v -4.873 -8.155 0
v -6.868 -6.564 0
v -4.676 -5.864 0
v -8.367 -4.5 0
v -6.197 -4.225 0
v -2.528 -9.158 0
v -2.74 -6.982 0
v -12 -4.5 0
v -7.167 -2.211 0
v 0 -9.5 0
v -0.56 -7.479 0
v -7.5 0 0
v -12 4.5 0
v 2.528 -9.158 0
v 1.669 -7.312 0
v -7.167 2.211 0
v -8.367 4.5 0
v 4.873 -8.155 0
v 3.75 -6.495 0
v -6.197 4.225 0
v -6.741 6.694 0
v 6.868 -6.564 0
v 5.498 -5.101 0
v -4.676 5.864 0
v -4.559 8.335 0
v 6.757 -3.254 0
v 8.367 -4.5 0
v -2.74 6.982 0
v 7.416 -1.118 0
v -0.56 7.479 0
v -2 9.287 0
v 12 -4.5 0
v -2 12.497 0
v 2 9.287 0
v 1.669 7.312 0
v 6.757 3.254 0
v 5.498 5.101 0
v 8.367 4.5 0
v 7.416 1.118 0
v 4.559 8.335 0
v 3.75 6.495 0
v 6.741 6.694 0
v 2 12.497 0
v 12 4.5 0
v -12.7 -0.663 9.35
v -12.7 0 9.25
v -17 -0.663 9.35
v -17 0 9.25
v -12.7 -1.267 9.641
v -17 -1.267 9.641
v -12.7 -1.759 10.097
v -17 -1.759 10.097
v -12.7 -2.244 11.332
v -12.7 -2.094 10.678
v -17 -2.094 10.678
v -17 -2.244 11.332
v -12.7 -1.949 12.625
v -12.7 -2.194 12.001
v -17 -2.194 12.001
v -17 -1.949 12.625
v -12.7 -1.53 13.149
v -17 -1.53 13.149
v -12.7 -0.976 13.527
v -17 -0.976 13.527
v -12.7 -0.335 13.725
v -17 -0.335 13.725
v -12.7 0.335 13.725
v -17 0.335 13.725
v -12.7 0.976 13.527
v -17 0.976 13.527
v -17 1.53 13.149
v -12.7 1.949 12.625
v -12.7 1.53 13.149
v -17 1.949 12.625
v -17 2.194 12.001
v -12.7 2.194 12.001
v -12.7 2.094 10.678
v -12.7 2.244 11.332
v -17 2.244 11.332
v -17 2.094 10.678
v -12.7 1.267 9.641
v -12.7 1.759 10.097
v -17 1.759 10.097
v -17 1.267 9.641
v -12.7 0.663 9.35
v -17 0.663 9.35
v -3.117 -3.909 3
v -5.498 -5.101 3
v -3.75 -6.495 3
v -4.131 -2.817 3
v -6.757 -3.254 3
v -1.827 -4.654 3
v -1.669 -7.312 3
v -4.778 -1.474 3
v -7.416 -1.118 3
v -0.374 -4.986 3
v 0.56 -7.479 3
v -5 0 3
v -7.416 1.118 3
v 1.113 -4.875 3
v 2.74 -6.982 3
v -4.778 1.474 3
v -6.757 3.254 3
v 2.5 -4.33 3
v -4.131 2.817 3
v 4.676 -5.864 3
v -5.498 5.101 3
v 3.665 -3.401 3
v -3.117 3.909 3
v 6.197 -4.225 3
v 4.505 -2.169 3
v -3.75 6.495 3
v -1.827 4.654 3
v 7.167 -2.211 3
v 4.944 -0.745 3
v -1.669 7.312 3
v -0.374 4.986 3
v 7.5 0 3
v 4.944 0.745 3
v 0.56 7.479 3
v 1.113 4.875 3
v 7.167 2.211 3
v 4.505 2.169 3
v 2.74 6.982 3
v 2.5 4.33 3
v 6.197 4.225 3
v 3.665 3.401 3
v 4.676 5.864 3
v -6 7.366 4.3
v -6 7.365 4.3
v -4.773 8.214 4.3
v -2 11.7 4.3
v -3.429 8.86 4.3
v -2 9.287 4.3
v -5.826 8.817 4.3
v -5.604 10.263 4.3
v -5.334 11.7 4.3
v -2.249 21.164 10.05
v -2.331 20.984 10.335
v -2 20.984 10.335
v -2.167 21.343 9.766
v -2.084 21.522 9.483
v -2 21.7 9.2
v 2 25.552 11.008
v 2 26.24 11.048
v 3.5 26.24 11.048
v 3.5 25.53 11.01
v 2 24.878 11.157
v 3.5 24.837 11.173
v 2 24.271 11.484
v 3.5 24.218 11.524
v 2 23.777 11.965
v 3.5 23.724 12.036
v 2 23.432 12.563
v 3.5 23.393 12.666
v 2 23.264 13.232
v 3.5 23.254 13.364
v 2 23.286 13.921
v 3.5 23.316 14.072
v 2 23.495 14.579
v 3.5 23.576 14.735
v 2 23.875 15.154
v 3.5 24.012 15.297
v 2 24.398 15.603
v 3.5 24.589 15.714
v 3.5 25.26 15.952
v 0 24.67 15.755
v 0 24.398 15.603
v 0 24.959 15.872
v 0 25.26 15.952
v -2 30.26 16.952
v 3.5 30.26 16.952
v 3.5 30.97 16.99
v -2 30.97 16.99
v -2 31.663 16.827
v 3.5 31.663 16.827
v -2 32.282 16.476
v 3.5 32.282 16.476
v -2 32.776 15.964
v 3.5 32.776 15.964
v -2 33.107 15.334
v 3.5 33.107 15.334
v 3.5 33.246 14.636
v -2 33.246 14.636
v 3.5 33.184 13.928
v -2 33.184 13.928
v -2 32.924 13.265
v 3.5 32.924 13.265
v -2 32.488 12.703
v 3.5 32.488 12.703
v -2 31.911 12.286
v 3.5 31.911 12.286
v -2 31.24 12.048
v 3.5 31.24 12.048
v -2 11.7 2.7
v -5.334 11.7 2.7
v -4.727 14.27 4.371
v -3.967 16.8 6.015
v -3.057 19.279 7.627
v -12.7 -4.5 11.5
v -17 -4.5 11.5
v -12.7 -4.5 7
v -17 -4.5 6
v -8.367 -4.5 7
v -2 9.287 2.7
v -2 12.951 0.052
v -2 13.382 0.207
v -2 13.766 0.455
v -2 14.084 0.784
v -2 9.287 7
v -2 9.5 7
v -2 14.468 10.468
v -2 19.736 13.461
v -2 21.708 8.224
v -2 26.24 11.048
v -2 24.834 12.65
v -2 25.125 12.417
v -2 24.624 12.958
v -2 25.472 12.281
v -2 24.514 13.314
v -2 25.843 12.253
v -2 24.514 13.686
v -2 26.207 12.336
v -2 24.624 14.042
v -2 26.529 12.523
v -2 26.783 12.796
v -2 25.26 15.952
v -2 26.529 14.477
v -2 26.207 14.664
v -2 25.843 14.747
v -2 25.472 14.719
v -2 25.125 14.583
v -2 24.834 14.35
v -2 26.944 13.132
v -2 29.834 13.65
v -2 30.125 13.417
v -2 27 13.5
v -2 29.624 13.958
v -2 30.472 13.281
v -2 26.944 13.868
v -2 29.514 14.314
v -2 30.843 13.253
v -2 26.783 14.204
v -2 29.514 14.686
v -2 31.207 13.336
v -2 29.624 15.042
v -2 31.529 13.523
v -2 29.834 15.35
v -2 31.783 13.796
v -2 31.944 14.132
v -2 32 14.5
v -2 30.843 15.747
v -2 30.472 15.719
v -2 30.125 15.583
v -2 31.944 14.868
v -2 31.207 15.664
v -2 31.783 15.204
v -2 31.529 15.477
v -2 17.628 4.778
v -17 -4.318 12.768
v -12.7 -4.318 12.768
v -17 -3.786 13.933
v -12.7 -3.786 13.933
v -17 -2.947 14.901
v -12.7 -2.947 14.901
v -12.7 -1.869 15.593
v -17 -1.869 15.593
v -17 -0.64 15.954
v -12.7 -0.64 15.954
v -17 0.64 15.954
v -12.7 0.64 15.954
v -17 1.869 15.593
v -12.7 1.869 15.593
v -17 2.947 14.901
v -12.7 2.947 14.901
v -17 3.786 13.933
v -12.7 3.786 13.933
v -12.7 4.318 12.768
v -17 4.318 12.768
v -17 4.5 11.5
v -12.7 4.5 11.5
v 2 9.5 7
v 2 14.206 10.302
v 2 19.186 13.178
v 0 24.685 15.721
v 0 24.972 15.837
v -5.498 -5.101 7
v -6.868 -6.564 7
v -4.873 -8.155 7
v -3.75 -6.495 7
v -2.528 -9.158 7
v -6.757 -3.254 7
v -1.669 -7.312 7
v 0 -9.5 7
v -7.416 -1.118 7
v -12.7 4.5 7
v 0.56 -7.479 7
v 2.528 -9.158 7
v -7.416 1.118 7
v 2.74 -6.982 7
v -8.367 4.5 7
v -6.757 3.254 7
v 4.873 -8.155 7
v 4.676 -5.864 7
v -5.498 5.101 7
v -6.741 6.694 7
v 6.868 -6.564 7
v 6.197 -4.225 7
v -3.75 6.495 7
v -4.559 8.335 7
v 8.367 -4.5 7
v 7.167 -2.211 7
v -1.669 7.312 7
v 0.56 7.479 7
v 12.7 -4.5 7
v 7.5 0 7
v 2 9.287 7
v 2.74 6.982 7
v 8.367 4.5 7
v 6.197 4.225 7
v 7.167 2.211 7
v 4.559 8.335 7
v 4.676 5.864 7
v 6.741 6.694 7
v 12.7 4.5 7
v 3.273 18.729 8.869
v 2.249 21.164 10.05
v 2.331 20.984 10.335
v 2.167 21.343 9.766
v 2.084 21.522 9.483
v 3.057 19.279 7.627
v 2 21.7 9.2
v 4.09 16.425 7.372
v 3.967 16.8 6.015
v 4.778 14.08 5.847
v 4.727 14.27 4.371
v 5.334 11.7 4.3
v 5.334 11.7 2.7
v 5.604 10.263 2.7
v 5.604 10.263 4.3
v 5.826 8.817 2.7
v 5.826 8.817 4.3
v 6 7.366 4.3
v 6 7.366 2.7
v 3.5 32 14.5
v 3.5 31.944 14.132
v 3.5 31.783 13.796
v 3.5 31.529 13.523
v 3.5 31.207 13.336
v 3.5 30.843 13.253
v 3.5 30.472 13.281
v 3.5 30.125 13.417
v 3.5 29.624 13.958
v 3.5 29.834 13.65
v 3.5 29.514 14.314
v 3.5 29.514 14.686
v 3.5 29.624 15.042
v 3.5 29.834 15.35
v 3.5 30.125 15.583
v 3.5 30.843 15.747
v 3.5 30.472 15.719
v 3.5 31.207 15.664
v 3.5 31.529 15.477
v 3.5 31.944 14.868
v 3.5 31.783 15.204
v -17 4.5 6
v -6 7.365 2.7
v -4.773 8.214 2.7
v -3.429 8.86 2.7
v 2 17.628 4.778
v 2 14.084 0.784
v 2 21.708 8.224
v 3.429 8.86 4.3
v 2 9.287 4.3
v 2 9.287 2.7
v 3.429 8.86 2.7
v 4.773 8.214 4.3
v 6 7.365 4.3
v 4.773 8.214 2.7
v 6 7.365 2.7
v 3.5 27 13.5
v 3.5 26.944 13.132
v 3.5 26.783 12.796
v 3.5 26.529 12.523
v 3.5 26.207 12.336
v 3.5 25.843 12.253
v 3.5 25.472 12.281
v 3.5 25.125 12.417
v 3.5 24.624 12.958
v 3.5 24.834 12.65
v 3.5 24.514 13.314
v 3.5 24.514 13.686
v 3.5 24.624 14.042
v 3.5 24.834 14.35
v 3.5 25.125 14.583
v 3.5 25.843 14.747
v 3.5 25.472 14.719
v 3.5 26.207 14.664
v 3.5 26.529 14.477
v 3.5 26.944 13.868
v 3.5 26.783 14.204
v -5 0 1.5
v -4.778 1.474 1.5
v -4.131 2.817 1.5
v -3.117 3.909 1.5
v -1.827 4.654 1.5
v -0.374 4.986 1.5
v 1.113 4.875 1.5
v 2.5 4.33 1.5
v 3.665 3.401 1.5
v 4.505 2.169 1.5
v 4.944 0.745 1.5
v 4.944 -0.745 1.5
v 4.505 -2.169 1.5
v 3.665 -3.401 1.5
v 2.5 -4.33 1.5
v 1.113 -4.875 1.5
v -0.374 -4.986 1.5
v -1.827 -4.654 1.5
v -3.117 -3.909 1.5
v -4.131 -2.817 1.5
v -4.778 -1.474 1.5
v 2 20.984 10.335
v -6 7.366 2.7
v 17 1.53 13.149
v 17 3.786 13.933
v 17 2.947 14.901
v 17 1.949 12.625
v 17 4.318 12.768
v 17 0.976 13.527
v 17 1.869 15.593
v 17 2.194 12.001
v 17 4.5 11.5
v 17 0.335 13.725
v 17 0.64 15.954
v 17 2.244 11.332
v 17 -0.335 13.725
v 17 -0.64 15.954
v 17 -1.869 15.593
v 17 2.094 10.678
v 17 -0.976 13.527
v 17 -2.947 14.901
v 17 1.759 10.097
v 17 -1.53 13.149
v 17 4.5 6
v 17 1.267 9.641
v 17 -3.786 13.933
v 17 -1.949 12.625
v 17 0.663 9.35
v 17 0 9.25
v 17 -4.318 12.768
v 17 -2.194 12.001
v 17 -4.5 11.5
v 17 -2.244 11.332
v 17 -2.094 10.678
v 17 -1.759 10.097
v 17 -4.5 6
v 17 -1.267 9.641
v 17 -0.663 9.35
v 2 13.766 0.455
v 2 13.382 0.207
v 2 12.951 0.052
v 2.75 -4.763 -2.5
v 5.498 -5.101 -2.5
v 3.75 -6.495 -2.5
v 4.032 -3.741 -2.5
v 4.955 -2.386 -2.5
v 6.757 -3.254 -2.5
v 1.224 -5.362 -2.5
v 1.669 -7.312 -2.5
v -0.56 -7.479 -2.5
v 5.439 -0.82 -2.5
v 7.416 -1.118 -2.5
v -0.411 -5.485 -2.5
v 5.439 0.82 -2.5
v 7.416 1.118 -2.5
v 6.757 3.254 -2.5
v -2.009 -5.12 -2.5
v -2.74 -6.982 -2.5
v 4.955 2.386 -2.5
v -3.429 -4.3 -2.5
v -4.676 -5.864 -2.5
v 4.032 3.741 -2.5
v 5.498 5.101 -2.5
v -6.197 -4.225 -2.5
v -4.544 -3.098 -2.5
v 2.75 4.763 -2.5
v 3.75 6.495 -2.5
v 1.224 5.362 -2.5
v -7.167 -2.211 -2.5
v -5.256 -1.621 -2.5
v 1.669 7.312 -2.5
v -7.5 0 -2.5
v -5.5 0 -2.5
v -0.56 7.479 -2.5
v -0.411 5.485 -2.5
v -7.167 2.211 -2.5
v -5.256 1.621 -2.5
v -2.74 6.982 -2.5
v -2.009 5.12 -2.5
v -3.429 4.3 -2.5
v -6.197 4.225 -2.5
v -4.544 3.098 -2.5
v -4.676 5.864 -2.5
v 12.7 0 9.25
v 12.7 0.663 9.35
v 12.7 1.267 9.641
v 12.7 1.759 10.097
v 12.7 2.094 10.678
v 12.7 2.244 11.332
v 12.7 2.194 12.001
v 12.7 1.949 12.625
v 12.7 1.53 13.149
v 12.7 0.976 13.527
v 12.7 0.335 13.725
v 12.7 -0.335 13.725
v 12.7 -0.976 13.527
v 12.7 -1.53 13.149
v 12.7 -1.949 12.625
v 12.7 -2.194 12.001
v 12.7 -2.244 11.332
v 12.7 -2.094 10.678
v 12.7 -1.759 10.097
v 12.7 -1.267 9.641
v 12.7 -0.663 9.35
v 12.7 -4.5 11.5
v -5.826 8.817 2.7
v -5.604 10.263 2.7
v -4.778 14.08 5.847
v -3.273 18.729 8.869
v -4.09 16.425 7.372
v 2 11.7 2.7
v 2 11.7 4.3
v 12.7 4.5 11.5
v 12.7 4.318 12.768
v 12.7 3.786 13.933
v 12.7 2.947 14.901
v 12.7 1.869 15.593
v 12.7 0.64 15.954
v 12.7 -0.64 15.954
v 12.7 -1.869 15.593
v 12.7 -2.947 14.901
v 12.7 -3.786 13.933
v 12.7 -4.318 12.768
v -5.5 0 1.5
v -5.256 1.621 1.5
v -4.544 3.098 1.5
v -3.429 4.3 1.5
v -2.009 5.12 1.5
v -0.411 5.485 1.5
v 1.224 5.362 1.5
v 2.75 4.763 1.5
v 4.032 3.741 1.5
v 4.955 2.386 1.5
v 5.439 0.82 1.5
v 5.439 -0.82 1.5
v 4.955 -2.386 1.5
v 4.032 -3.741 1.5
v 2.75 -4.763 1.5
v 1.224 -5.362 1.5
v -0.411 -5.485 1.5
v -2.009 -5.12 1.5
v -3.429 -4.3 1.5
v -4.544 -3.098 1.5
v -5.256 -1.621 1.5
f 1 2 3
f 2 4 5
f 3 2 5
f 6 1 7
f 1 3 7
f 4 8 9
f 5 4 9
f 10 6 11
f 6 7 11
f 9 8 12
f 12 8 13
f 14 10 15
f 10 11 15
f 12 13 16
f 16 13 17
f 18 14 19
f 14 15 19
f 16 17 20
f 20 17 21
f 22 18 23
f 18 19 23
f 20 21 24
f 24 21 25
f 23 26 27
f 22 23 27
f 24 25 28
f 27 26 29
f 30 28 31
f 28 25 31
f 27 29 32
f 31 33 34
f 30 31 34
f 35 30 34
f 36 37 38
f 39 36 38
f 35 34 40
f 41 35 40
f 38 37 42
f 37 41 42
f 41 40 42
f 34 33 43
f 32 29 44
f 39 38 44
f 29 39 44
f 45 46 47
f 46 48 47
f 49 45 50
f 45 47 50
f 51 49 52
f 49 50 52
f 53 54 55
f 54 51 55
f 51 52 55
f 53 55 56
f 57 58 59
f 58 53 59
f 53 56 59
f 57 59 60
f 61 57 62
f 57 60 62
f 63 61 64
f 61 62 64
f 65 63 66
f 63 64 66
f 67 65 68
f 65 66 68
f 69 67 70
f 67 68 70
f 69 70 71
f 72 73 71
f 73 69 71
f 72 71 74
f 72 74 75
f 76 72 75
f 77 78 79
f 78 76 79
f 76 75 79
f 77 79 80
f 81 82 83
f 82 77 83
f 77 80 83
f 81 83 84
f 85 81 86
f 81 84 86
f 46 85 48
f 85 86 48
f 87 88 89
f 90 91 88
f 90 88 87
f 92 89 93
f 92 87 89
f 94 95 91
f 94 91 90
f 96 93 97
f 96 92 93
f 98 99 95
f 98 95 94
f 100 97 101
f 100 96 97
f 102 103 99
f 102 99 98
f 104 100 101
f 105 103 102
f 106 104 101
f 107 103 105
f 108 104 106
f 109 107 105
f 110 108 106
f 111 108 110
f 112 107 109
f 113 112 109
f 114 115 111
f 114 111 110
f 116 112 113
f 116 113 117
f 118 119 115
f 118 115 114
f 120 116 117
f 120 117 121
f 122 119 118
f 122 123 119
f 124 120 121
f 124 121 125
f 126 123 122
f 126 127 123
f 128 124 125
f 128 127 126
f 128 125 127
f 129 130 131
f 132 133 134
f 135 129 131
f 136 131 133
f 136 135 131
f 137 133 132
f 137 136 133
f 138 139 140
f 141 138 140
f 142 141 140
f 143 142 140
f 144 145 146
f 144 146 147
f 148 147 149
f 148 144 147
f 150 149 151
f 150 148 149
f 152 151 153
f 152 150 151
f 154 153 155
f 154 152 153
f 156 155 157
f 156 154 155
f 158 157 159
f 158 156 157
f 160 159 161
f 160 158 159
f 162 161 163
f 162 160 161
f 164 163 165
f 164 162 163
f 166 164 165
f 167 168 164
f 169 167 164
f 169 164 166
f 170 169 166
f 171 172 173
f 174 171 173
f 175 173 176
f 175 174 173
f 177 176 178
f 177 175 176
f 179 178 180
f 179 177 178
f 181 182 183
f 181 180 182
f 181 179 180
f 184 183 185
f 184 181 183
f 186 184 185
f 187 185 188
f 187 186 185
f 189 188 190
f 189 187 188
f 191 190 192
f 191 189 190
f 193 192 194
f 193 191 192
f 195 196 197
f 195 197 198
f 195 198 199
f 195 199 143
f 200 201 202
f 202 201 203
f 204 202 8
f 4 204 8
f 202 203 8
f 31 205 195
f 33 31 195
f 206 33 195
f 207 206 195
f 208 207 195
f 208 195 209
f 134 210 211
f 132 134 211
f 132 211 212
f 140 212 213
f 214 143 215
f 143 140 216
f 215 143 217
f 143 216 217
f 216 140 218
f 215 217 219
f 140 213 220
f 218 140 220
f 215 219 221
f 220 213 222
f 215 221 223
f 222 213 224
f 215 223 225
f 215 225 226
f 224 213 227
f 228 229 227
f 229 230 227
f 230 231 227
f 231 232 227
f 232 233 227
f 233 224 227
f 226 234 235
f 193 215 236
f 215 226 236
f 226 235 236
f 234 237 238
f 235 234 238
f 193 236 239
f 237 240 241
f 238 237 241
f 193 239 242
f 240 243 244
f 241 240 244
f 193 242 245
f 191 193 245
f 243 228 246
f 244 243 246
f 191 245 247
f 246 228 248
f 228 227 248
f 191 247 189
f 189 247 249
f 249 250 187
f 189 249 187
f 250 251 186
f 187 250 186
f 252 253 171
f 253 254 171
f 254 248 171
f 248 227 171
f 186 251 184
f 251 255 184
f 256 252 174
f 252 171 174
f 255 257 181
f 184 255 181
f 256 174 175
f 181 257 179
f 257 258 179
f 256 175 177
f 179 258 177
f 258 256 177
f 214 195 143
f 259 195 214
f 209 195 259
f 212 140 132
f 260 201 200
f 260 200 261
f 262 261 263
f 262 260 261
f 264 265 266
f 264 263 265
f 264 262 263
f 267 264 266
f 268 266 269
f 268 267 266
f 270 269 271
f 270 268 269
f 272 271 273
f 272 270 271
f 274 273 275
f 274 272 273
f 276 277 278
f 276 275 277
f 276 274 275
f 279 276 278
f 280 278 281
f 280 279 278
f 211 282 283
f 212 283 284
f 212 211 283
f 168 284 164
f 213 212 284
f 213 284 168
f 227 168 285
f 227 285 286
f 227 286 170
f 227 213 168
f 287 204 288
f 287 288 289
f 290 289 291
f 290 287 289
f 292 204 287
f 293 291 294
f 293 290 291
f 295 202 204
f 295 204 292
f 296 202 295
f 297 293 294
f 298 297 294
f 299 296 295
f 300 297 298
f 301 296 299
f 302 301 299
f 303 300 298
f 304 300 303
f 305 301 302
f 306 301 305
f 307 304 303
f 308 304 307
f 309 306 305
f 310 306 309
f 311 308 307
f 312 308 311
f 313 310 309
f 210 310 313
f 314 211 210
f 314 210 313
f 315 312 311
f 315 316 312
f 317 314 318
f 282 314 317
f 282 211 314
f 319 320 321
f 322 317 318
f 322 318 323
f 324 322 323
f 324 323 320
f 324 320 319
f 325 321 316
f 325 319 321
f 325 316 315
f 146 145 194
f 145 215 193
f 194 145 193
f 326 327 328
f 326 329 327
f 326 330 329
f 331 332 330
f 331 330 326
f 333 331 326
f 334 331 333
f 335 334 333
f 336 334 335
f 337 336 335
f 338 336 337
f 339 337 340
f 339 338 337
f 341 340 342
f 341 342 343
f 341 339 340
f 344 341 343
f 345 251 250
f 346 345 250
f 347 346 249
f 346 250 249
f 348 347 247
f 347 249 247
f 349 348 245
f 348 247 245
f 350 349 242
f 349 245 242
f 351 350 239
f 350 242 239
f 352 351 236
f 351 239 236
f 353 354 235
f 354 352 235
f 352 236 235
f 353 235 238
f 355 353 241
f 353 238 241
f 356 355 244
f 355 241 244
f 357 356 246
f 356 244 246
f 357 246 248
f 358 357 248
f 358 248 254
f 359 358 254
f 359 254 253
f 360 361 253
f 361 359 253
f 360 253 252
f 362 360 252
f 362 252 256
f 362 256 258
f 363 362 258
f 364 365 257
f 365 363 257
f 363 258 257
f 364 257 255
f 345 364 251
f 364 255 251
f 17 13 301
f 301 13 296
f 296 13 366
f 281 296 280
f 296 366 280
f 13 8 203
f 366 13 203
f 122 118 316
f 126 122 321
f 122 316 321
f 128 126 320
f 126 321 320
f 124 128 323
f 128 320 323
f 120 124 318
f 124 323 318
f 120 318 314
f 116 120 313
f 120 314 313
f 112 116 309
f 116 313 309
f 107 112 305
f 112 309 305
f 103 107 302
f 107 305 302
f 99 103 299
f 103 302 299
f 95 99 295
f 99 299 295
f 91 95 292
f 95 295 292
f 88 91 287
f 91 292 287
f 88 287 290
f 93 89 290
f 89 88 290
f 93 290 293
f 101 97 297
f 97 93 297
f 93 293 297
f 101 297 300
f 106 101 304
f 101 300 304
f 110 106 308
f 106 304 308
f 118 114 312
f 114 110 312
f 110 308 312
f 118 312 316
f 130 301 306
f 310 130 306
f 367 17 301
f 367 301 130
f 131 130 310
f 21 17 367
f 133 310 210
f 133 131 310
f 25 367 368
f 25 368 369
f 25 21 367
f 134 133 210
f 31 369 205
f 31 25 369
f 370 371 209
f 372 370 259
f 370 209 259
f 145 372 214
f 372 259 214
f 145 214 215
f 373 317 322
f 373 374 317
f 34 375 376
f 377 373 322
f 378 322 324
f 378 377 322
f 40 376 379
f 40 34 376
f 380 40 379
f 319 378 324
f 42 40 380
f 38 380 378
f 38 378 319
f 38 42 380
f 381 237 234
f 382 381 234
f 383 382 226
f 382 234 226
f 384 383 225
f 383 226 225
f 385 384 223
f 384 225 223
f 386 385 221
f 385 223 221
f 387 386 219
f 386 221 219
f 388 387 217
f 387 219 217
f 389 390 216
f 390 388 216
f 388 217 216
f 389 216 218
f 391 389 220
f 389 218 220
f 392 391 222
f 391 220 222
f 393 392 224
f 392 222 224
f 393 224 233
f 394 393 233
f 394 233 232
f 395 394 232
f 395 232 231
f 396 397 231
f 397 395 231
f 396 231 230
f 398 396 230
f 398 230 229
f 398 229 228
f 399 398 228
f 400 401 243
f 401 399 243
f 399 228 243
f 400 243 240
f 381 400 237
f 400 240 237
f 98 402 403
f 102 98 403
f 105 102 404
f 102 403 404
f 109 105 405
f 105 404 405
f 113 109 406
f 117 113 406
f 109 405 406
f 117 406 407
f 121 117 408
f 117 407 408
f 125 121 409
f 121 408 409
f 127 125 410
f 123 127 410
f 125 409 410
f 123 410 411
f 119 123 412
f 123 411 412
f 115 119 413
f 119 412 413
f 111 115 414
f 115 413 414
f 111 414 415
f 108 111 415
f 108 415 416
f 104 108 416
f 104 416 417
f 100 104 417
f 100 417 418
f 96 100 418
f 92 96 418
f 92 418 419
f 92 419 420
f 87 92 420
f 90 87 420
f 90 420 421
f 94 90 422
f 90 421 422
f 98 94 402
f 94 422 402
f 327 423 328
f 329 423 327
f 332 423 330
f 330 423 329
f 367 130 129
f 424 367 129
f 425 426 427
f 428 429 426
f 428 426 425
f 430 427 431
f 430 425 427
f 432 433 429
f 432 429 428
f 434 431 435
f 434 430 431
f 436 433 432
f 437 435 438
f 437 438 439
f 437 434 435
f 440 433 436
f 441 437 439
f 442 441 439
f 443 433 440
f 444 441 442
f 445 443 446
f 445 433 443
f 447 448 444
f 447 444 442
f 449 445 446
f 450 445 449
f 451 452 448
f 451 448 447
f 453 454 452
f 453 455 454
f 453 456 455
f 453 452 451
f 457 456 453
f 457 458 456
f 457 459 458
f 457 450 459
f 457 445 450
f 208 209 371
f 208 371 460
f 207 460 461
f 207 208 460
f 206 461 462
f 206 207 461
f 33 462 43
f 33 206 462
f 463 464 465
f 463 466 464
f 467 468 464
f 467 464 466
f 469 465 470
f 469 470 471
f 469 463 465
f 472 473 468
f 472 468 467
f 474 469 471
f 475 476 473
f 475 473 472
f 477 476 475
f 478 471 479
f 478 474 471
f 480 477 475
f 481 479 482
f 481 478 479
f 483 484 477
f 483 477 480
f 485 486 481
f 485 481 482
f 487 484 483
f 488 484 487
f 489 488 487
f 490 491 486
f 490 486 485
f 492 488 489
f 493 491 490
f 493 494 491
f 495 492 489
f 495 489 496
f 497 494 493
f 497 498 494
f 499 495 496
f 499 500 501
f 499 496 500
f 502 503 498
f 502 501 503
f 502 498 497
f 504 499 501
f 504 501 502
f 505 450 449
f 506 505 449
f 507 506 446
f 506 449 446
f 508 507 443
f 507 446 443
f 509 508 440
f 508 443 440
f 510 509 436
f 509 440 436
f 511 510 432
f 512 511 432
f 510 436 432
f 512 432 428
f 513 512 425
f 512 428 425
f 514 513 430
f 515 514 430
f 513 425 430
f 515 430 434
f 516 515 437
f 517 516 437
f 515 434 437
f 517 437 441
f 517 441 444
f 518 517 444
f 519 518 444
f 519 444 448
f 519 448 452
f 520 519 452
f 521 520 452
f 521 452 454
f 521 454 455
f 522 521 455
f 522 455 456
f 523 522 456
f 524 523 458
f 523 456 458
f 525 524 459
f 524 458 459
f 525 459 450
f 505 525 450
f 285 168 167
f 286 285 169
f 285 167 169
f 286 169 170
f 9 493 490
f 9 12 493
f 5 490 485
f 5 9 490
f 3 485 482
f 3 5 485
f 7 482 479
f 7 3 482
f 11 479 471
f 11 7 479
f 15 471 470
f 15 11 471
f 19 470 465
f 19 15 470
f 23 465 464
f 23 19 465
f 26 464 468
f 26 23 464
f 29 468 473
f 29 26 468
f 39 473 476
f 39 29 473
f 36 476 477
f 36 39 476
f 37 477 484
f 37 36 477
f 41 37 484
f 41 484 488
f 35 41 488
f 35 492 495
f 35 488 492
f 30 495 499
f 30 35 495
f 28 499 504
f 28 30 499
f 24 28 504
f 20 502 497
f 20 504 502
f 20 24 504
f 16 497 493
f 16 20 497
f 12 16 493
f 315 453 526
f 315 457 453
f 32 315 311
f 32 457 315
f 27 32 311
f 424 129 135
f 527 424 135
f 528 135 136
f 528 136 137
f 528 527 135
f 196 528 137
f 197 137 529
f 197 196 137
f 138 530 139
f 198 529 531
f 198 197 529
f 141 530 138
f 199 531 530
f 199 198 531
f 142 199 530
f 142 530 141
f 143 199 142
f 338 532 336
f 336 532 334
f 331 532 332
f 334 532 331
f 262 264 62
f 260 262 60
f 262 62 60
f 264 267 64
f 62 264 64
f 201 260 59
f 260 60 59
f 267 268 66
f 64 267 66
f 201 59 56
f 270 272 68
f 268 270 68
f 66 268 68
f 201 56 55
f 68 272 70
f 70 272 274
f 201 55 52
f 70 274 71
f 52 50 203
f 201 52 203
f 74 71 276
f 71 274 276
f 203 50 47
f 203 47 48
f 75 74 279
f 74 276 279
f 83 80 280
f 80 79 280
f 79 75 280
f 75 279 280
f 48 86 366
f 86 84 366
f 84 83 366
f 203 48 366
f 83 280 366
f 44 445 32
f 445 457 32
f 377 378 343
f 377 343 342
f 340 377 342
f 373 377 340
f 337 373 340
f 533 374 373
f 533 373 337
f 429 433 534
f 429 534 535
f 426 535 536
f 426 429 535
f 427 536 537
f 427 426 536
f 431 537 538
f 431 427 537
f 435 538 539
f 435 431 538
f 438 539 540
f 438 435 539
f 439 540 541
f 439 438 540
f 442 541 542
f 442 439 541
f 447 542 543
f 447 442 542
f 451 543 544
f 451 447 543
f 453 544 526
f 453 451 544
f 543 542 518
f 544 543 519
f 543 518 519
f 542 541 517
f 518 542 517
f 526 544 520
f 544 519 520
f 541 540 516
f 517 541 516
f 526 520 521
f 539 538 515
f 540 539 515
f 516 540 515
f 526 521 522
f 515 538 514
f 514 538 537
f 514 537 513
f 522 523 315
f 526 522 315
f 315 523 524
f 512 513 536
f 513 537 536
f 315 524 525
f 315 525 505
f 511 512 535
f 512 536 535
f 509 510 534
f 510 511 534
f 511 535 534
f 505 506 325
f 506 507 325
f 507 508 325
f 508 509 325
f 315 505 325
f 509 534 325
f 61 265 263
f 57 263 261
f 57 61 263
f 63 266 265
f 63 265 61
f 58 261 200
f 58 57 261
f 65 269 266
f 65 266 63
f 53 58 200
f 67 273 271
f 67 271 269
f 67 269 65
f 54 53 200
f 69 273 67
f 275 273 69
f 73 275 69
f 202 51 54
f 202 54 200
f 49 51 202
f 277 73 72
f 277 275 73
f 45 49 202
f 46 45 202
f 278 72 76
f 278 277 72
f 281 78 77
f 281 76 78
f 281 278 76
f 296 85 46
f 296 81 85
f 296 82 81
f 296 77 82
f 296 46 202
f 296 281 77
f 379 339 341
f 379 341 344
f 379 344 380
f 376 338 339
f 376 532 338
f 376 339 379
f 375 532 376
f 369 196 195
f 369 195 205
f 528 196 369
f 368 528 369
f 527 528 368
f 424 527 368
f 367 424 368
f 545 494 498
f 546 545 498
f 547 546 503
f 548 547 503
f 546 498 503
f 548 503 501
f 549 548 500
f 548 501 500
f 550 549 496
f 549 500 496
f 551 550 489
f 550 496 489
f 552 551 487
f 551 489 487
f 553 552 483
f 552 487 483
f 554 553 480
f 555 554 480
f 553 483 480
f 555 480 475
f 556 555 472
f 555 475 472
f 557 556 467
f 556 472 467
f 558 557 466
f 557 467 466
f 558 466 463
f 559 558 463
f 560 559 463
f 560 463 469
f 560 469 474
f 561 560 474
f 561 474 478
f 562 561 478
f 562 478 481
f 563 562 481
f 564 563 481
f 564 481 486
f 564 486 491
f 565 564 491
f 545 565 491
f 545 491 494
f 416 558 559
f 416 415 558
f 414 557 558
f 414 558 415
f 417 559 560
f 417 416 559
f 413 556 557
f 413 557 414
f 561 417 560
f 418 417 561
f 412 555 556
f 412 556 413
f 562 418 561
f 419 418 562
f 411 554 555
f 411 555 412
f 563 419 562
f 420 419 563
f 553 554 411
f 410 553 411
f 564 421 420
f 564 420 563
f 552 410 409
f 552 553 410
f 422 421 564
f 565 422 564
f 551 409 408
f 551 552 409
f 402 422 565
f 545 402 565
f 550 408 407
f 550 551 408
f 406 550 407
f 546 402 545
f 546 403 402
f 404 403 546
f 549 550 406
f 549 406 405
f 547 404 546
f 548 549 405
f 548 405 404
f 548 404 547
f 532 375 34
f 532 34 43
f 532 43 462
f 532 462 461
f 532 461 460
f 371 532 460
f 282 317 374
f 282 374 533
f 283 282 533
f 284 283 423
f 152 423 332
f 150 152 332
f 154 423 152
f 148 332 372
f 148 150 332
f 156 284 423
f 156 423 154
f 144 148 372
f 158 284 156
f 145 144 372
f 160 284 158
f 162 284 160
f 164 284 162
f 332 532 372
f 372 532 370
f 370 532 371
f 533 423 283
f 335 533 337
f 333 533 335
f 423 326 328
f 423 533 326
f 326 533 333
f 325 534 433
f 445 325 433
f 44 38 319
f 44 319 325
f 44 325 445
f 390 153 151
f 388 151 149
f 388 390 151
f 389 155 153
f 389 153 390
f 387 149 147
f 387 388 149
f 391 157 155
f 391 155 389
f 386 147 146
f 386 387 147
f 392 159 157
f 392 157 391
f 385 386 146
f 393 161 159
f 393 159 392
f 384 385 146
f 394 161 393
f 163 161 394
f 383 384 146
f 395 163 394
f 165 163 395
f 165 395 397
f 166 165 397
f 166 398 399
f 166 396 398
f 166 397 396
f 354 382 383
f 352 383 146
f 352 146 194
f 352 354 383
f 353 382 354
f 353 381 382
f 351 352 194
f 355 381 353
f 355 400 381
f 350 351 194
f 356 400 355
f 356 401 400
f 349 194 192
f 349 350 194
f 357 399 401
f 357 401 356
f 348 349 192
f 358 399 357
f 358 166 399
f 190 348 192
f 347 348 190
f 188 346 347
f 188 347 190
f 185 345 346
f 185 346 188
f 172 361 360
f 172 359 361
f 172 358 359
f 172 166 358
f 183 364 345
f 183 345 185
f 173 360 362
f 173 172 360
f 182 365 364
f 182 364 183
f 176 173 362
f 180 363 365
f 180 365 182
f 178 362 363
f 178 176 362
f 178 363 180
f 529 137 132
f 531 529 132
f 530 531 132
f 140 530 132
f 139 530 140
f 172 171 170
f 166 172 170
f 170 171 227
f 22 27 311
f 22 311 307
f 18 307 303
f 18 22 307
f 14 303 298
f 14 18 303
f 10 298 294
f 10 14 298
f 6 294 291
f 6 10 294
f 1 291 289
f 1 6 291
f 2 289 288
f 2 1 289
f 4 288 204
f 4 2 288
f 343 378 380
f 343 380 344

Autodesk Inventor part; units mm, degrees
ref_plane "YZ Plane" through (0, 0, 0) normal (1, 0, 0) x (0, 1, 0)
ref_plane "XZ Plane" through (0, 0, 0) normal (0, 1, 0) x (-1, 0, 0)
ref_plane "XY Plane" through (0, 0, 0) normal (0, 0, 1) x (1, 0, 0)
sketch "Sketch1" plane through (0, 0, 0) normal (0, 0, 1) x (1, 0, 0)
  line L0 (17, 4.5) -> (17, -4.5)
  line L1 (-17, -4.5) -> (-17, 4.5)
  arc A0 (-8.3666, -4.5) -> (8.3666, -4.5) centre (0, 0) ccw
  arc A1 (8.3666, 4.5) -> (-8.3666, 4.5) centre (0, 0) ccw
  line L2 (-17, 4.5) -> (-8.3666, 4.5)
  line L3 (8.3666, 4.5) -> (17, 4.5)
  line L4 (17, -4.5) -> (8.3666, -4.5)
  line L5 (-8.3666, -4.5) -> (-17, -4.5)
  line L6 (-17, 4.5) -> (17, -4.5) construction
  line L7 (-17, -4.5) -> (17, 4.5) construction
  point P0 (0, 0)
  point P1 (0, 0)
  dimension "d0" = 9
  dimension "d1" = 34
  dimension "d2" = 9.5
  dimension "d3" = 9
  dimension "d4" = 9.5
  dimension "d12" = 4.5
extrude "Extrusion1" add sketch "Sketch1" along normal blind 7
sketch "Sketch2" plane through (17, -4.5, 0) normal (1, 0, 0) x (0, 0, -1)
  arc A0 (-11.5, 9) -> (-11.5, 0) centre (-11.5, 4.5) ccw
  circle A1 centre (-11.5, 4.5) radius 2.25
  line L0 (-7, 9) -> (-11.5, 9)
  line L1 (-11.5, 0) -> (-7, 0)
  line L2 (-7, 0) -> (-7, 9)
  point P0 (0, 4.5)
  point P1 (-7, 0)
  dimension "d7" = 9
  dimension "d8" = 4.5
  dimension "d9" = 9
extrude "Extrusion2" add sketch "Sketch2" against normal blind 4.3
extrude "Extrusion3" add sketch "Sketch2" along normal blind 4.3 from surface at -34
sketch "Sketch3" plane through (-17, -4.5, 0) normal (0, -1, 0) x (1, 0, 0)
  line L0 (0, 6) -> (0, 0)
  line L1 (0, 0) -> (5, 0)
  line L2 (5, 0) -> (0, 6)
  line L3 (29, 0) -> (34, 0)
  line L4 (34, 0) -> (34, 6)
  line L5 (34, 6) -> (29, 0)
  point P0 (17, 0)
  dimension "d15" = 6
  dimension "d16" = 5
  dimension "d17" = 6
  dimension "d18" = 5
extrude "Extrusion4" cut sketch "Sketch3" against normal up to next
sketch "Sketch4" plane through (0, 0, 0) normal (0, 0, -1) x (-1, 0, 0)
  circle A0 centre (0, 0) radius 7.5
  dimension "d21" = 15
extrude "Extrusion5" add sketch "Sketch4" along normal blind 2.5
sketch "Sketch5" plane through (0, 0, 7) normal (0, 0, 1) x (1, 0, 0)
  circle A0 centre (0, 0) radius 7.5
  dimension "d24" = 15
extrude "Extrusion6" cut sketch "Sketch5" against normal blind 4
sketch "Sketch6" plane through (0, 0, -2.5) normal (0, 0, -1) x (-1, 0, 0)
  circle A0 centre (0, 0) radius 5.5
  dimension "d27" = 11
extrude "Extrusion7" cut sketch "Sketch6" against normal blind 4
sketch "Sketch7" plane through (0, 0, 1.5) normal (0, 0, -1) x (-1, 0, 0)
  circle A0 centre (0, 0) radius 5
  dimension "d30" = 10
extrude "Extrusion8" cut sketch "Sketch7" against normal up to next
sketch "Sketch9" plane through (0, 0, 0) normal (1, 0, 0) x (0, 1, 0)
  line L0 (-9.5504, 0) -> (57.3026, 0) projected
  line L1 (0, -37.6235) -> (0, 29.8791) projected
  line L2 (9.5, 0) -> (4.5, 0) projected
  line L3 (9.5, 7) -> (4.5, 7) projected
  circle A0 centre (30.75, 14.5) radius 1.25
  circle A1 centre (25.75, 13.5) radius 1.25
  line L4 (8.5, 7) -> (9.5, 7)
  line L5 (13.5, 7) -> (13.5, 0) construction
  line L6 (12.4966, 0) -> (8.5, 0)
  line L7 (8.5, 0) -> (8.5, 7)
  line L8 (25.75, 13.5) -> (30.75, 14.5) construction
  line L9 (26.2403, 11.0485) -> (31.2403, 12.0485)
  line L10 (30.2597, 16.9515) -> (25.2597, 15.9515)
  arc A2 (25.2597, 15.9515) -> (26.2403, 11.0485) centre (25.75, 13.5) ccw construction
  arc A3 (31.2403, 12.0485) -> (30.2597, 16.9515) centre (30.75, 14.5) ccw
  arc A4 (25.2597, 15.9515) -> (9.5, 7) centre (49.2826, -44.6916) ccw
  arc A5 (26.2403, 11.0485) -> (14.0842, 0.7836) centre (43.5805, -21.8166) ccw
  arc A6 (12.4966, 0) -> (14.0842, 0.7836) centre (12.4966, 2) ccw
  point P0 (0, 0)
  point P1 (28.25, 14)
  dimension "d133" = 2.5
  dimension "d134" = 30.75
  dimension "d135" = 14.5
  dimension "d136" = 2.5
  dimension "d137" = 13.5
  dimension "d138" = 25.75
  dimension "d139" = 7
  dimension "d140" = 5
  dimension "d141" = 8.5
  dimension "d142" = 5
  dimension "d143" = 65.2279
  dimension "d144" = 37.1592
  dimension "d145" = 2
extrude "Extrusion22" add sketch "Sketch9" along normal mid plane 4
sketch "Sketch19" plane through (0, 0, 0) normal (1, 0, 0) x (0, 1, 0)
  circle A0 centre (25.75, 13.5) radius 1.25 projected
  circle A1 centre (25.75, 13.5) radius 1.25
  circle A2 centre (30.75, 14.5) radius 1.25 projected
  circle A3 centre (30.75, 14.5) radius 1.25
  line L0 (25.75, 13.5) -> (30.75, 14.5) construction
  line L1 (26.2403, 11.0485) -> (31.2403, 12.0485)
  line L2 (30.2597, 16.9515) -> (25.2597, 15.9515)
  arc A4 (25.2597, 15.9515) -> (26.2403, 11.0485) centre (25.75, 13.5) ccw
  arc A5 (31.2403, 12.0485) -> (30.2597, 16.9515) centre (30.75, 14.5) ccw
  point P0 (0, 0)
  point P1 (28.25, 14)
  dimension "d148" = 2.5
  dimension "d149" = 2.5
  dimension "d150" = 5
extrude "Extrusion23" add sketch "Sketch19" along normal blind 3.5
sketch "Sketch20" plane through (0, 0, 0) normal (1, 0, 0) x (0, 1, 0)
  line L0 (0, 4.3) -> (11.7, 4.3)
  line L1 (11.7, 4.3) -> (11.7, 2.7) construction
  line L2 (11.7, 2.7) -> (0, 2.7)
  line L3 (0, 2.7) -> (0, 4.3)
  line L4 (-18.05, 0) -> (41.8, 0) projected
  line L5 (0, -6.4) -> (0, 20.9) projected
  line L6 (11.7, 2.7) -> (21.7, 9.2)
  line L7 (11.7, 4.3) -> (20.9843, 10.3348)
  line L8 (20.9843, 10.3348) -> (21.7, 9.2)
  point P0 (0, 0)
  dimension "d153" = 1.6
  dimension "d154" = 11.7
  dimension "d155" = 2.7
  dimension "d156" = 10
  dimension "d157" = 6.5
  dimension "d158" = 1.1348
extrude "Extrusion24" add sketch "Sketch20" along normal mid plane 12
sketch "Sketch21" plane through (0, 0, 7) normal (0, 0, 1) x (1, 0, 0)
  circle A0 centre (0, 0) radius 7.5
  dimension "d161" = 15
extrude "Extrusion25" cut sketch "Sketch5" against normal blind 4
sketch "Sketch22" plane through (0, 0, 1.5) normal (0, 0, -1) x (-1, 0, 0)
  circle A0 centre (0, 0) radius 5
  dimension "d164" = 10
extrude "Extrusion26" cut sketch "Sketch22" against normal through all
sketch "Sketch23" plane through (0, 0, 0) normal (0, 0, 1) x (1, 0, 0)
  line L0 (-6, 21.7) -> (-2, 21.7) projected
  line L1 (-6, 21.7) -> (-6, 11.7) projected
  line L2 (-2, 21.7) -> (-6, 21.7)
  line L3 (-6, 7.3655) -> (-6, 11.7) projected
  line L4 (-6, 21.7) -> (-6, 7.3655)
  arc A0 (-2, 21.7) -> (-6, 7.3655) centre (37.8943, 2.8423) ccw
  line L5 (0, 17.7237) -> (0, 15.5632) construction
  line L6 (6, 21.7) -> (2, 21.7)
  line L7 (6, 21.7) -> (6, 11.7)
  line L8 (6, 7.3655) -> (6, 11.7)
  arc A1 (6, 7.3655) -> (2, 21.7) centre (-37.8943, 2.8423) ccw
  point P0 (0, 0)
extrude "Extrusion27" cut sketch "Sketch23" along normal through all
properties part number "RCT-P006_steering_knuckle"
